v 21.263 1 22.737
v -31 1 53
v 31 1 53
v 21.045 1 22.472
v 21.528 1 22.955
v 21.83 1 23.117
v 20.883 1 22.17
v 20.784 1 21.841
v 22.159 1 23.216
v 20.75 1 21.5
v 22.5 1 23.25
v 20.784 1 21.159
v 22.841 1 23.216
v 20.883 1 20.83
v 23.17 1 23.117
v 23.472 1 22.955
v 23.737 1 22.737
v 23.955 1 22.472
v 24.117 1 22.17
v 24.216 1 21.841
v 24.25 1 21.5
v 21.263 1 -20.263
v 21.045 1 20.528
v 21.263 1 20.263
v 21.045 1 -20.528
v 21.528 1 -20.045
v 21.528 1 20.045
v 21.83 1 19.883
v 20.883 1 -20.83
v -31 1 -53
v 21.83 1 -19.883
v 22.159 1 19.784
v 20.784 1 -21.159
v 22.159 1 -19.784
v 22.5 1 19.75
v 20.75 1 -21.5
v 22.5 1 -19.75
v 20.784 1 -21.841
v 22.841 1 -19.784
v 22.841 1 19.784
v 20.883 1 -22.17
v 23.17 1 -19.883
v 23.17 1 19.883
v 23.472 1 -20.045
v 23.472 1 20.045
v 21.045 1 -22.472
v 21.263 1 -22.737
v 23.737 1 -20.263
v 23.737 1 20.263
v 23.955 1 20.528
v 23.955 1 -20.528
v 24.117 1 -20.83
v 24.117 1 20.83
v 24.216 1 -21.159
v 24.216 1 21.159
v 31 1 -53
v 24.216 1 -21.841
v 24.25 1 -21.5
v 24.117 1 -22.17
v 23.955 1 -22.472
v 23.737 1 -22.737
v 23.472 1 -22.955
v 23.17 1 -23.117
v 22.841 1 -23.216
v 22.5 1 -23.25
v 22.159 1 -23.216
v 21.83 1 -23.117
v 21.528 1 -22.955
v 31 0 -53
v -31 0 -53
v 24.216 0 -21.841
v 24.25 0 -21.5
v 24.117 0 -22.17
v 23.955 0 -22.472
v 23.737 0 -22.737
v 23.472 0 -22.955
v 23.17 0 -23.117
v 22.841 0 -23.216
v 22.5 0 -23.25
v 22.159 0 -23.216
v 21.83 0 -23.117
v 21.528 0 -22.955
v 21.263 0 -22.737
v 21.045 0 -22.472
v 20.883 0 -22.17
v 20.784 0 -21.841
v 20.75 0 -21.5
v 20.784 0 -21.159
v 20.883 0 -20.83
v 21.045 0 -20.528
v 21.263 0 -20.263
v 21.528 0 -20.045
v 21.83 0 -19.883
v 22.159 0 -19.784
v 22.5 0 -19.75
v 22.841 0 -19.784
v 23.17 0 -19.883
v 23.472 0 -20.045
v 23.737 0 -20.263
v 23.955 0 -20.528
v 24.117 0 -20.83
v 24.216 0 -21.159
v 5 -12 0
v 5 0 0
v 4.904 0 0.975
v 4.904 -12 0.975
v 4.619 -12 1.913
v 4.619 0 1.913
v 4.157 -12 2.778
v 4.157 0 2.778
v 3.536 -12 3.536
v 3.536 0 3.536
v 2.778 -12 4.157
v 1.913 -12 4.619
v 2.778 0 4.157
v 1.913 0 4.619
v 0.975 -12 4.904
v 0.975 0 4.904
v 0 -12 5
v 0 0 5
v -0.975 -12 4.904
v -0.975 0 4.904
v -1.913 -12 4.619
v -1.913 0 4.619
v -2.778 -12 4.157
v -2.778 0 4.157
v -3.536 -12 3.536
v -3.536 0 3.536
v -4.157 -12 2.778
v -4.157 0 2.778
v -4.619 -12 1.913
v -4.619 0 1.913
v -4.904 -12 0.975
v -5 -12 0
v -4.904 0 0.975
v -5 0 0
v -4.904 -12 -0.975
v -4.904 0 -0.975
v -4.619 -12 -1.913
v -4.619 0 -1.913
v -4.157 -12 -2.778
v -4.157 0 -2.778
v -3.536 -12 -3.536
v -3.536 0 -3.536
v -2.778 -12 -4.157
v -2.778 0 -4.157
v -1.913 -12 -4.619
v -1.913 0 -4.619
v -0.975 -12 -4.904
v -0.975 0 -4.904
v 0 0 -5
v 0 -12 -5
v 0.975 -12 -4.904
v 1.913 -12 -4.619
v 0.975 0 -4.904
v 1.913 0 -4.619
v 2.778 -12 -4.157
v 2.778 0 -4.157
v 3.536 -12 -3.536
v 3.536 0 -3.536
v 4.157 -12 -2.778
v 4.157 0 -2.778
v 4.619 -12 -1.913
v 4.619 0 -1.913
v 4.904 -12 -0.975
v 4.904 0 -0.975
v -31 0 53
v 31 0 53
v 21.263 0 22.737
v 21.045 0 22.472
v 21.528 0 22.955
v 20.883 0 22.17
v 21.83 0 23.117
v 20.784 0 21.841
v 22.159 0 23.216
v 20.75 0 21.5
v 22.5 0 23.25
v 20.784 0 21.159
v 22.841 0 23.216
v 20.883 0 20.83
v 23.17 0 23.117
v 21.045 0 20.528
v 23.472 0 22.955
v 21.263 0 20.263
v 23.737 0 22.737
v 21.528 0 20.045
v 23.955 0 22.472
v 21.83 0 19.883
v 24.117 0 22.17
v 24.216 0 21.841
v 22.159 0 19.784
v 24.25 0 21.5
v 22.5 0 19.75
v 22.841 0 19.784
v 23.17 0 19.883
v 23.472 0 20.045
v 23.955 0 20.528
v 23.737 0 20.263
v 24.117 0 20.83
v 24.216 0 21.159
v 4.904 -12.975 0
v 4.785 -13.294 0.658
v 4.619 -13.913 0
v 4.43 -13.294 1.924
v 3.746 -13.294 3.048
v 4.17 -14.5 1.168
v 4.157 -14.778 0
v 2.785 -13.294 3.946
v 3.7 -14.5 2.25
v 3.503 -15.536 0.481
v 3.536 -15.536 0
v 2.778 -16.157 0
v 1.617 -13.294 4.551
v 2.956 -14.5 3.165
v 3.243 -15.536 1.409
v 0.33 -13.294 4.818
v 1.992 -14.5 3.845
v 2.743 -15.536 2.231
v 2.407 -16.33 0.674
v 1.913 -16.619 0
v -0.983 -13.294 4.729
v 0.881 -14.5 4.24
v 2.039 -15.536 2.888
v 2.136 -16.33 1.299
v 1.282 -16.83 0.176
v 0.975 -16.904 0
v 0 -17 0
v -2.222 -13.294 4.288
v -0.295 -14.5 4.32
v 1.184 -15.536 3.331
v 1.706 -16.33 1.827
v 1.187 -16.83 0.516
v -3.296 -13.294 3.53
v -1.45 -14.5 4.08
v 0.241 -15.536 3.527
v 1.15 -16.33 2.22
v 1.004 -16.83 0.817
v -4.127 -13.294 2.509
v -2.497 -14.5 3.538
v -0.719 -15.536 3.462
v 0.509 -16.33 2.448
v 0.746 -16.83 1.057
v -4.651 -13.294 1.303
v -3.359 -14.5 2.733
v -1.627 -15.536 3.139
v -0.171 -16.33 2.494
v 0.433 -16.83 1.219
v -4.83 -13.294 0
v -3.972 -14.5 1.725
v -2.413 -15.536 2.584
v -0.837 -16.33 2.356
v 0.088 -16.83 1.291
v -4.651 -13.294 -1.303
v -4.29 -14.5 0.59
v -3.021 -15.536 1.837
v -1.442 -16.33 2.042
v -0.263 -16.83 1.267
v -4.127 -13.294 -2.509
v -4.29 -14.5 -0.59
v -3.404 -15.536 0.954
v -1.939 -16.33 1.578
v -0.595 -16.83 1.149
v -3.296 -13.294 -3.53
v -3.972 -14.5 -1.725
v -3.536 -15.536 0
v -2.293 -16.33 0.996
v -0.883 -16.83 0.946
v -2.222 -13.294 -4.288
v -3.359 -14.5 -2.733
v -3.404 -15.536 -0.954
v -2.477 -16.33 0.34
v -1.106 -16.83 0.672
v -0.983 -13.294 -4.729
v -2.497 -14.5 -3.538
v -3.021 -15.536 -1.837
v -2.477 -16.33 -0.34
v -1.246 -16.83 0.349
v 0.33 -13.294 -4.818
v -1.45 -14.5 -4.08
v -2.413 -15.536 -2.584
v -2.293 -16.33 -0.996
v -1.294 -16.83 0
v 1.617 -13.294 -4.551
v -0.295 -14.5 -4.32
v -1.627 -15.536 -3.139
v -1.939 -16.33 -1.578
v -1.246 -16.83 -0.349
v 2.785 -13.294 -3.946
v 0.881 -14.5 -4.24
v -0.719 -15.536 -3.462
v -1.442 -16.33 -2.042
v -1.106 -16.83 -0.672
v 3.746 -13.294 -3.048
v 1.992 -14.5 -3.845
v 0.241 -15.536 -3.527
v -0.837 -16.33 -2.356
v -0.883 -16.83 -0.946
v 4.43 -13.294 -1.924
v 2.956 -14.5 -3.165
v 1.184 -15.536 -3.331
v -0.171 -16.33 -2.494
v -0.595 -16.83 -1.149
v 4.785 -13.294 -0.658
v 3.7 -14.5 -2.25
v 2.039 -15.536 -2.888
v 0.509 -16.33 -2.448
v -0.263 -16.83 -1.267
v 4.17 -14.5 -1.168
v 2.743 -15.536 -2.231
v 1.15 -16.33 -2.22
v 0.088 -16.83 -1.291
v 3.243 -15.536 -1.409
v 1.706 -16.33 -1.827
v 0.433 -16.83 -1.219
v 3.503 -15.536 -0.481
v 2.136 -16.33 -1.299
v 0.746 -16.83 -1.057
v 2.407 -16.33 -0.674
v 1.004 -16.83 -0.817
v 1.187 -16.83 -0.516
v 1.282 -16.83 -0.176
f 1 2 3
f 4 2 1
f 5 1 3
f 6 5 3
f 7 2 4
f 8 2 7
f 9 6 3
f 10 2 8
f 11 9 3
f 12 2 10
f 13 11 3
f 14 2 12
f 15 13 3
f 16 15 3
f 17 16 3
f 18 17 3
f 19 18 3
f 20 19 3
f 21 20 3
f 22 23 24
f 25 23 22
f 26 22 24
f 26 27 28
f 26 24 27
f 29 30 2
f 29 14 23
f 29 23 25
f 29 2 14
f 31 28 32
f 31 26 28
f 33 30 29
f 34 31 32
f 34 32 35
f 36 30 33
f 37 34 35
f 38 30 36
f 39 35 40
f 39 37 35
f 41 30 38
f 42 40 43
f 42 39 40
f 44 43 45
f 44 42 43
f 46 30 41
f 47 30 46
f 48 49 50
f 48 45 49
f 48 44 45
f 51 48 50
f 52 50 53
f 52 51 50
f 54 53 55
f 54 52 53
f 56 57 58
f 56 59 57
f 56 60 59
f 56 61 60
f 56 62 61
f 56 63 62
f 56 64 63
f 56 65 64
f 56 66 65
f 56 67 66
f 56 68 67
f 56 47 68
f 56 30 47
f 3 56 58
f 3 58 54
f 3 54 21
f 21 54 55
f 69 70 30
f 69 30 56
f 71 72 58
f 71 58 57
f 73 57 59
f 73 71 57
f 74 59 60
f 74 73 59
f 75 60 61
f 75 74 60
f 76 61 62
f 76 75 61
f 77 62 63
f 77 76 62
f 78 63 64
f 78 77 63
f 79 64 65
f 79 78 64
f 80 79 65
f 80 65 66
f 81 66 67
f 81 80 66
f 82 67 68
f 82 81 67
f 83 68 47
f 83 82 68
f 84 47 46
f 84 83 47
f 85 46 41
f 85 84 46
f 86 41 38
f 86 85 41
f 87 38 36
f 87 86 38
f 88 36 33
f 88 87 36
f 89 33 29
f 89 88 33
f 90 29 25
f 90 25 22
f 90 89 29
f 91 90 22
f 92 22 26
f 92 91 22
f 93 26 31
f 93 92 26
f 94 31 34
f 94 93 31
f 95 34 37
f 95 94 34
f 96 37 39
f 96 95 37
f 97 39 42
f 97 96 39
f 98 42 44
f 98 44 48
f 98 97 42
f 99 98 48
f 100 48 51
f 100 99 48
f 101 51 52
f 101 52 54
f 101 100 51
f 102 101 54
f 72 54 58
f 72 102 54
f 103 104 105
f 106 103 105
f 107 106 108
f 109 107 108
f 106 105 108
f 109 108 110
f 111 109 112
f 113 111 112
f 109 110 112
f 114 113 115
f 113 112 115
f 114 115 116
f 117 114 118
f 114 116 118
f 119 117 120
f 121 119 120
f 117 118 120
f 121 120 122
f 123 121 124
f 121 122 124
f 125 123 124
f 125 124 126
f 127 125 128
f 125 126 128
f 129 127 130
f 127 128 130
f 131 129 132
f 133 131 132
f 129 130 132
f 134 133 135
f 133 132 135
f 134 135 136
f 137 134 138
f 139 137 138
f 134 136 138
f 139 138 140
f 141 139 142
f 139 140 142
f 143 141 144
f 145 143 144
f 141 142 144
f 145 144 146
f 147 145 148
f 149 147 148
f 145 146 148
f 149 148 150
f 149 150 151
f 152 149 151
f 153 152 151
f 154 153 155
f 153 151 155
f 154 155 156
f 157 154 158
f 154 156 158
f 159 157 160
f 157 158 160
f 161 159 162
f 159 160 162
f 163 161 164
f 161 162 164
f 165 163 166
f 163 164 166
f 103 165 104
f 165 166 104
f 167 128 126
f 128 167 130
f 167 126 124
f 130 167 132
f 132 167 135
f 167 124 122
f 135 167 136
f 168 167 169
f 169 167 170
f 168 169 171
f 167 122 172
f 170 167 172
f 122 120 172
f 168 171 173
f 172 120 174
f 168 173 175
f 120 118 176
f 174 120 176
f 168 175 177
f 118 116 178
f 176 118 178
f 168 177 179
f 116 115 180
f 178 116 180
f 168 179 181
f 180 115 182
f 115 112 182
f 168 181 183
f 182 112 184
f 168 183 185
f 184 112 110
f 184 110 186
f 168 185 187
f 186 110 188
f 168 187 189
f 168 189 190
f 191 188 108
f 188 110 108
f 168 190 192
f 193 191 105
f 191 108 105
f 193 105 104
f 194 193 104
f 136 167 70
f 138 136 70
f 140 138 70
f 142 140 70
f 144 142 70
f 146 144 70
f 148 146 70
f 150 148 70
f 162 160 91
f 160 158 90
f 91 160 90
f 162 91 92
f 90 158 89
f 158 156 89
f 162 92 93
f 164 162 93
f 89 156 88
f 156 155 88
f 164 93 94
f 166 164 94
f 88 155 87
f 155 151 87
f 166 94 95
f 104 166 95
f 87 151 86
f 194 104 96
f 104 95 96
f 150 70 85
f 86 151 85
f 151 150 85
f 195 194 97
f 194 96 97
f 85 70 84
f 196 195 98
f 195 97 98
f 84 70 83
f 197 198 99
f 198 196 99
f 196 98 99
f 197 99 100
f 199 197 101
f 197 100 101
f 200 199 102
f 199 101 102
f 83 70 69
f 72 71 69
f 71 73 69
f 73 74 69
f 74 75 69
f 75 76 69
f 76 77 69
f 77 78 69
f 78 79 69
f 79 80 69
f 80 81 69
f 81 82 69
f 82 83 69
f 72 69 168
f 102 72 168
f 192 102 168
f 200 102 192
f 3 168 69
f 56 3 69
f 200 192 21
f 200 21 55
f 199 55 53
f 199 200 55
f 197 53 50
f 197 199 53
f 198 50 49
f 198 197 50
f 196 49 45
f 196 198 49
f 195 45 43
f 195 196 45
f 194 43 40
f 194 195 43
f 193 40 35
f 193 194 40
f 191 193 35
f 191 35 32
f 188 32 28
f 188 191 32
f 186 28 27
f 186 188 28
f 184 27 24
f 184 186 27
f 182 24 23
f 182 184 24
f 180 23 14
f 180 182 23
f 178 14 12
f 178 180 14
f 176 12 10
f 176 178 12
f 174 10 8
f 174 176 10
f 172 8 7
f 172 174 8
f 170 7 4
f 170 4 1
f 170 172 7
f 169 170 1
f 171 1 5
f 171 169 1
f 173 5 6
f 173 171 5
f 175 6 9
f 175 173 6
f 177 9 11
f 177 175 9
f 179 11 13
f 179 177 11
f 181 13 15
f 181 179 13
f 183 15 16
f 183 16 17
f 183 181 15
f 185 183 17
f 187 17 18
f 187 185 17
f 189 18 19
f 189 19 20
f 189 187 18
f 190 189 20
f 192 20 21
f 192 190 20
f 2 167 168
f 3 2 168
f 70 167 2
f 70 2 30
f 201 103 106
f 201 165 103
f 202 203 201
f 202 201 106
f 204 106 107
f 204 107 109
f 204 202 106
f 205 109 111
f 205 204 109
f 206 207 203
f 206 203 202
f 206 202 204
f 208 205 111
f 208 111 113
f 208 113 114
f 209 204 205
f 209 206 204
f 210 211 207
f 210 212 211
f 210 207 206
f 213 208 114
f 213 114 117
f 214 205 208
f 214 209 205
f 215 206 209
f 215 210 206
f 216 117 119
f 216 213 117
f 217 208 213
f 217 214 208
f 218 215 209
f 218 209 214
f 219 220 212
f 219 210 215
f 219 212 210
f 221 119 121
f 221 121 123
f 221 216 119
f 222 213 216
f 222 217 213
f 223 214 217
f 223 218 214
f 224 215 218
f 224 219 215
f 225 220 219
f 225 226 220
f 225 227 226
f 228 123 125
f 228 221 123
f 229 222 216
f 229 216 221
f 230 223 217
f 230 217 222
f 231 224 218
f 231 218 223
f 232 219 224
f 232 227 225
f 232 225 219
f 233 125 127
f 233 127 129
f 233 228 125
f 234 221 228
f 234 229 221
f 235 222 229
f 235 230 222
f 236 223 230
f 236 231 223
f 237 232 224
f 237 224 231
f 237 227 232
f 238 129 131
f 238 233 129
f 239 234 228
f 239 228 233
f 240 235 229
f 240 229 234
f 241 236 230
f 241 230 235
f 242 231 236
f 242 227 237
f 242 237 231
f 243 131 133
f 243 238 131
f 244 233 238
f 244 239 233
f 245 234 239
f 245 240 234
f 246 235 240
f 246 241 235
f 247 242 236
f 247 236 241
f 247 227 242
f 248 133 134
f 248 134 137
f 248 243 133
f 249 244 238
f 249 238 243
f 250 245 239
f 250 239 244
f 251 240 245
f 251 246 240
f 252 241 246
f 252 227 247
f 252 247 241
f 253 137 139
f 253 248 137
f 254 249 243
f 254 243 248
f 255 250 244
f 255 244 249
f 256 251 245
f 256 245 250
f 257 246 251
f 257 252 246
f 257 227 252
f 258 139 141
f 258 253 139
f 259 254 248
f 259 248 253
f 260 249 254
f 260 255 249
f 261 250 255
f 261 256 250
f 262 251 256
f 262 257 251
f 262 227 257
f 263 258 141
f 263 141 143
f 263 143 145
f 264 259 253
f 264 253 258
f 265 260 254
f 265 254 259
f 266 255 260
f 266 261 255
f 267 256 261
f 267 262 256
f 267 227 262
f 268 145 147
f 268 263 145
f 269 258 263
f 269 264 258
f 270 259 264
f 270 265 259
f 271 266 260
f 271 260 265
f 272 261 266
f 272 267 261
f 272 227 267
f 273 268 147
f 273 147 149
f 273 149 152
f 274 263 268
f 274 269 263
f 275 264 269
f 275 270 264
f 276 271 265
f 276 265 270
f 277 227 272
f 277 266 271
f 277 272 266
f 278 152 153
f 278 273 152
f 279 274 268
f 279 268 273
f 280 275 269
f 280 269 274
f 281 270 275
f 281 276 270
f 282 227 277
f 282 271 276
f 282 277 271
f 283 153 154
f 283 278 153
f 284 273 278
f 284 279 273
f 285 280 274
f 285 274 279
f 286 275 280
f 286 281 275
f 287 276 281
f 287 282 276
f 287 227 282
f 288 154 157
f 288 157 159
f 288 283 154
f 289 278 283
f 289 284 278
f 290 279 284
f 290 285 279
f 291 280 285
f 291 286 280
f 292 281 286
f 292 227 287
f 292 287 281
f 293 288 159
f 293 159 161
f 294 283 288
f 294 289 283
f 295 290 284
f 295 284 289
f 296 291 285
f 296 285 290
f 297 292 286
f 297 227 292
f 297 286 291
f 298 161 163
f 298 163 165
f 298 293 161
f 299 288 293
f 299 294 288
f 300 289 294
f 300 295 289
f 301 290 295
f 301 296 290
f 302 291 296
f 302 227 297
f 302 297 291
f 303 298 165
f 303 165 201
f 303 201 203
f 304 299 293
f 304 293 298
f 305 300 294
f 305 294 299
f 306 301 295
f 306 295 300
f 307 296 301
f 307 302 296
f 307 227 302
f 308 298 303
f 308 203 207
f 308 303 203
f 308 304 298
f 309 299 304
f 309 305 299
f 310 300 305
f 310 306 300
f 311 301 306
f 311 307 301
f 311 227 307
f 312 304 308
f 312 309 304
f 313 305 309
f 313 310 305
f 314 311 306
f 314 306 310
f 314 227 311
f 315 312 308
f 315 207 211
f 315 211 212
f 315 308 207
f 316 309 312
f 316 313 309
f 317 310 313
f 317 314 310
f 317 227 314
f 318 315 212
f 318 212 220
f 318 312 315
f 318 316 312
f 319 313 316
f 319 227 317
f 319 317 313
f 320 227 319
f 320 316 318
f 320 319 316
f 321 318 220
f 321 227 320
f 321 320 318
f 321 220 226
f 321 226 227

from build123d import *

# Parameters (mm, degrees)
SKETCH1_W           = 62
SKETCH1_H           = 106
SKETCH1_R           = 1.75
BOSS_EXTRUDE1_DEPTH = 1
SKETCH2_R           = 5
BOSS_EXTRUDE2_DEPTH = 17
FILLET1_R           = 5


with BuildPart() as part:
    # Sketch1 → Boss-Extrude1 (new body)
    with BuildSketch(Plane(origin=(0, 0, 0), x_dir=(1, 0, 0), z_dir=(0, 1, 0))):
        Rectangle(SKETCH1_W, SKETCH1_H)
        with Locations((22.5, -21.5)):
            Circle(SKETCH1_R, mode=Mode.SUBTRACT)
        with Locations((22.5, 21.5)):
            Circle(SKETCH1_R, mode=Mode.SUBTRACT)
    extrude(amount=BOSS_EXTRUDE1_DEPTH)

    # Sketch2 → Boss-Extrude2 (add)
    with BuildSketch(Plane.XZ):
        Circle(SKETCH2_R)
    extrude(amount=BOSS_EXTRUDE2_DEPTH)

    # Fillet1
    fillet1_edges = [part.edges().sort_by_distance(p)[0] for p in [
        (-5, -17, 0),
    ]]
    fillet(fillet1_edges, radius=FILLET1_R)


solid = part.part
